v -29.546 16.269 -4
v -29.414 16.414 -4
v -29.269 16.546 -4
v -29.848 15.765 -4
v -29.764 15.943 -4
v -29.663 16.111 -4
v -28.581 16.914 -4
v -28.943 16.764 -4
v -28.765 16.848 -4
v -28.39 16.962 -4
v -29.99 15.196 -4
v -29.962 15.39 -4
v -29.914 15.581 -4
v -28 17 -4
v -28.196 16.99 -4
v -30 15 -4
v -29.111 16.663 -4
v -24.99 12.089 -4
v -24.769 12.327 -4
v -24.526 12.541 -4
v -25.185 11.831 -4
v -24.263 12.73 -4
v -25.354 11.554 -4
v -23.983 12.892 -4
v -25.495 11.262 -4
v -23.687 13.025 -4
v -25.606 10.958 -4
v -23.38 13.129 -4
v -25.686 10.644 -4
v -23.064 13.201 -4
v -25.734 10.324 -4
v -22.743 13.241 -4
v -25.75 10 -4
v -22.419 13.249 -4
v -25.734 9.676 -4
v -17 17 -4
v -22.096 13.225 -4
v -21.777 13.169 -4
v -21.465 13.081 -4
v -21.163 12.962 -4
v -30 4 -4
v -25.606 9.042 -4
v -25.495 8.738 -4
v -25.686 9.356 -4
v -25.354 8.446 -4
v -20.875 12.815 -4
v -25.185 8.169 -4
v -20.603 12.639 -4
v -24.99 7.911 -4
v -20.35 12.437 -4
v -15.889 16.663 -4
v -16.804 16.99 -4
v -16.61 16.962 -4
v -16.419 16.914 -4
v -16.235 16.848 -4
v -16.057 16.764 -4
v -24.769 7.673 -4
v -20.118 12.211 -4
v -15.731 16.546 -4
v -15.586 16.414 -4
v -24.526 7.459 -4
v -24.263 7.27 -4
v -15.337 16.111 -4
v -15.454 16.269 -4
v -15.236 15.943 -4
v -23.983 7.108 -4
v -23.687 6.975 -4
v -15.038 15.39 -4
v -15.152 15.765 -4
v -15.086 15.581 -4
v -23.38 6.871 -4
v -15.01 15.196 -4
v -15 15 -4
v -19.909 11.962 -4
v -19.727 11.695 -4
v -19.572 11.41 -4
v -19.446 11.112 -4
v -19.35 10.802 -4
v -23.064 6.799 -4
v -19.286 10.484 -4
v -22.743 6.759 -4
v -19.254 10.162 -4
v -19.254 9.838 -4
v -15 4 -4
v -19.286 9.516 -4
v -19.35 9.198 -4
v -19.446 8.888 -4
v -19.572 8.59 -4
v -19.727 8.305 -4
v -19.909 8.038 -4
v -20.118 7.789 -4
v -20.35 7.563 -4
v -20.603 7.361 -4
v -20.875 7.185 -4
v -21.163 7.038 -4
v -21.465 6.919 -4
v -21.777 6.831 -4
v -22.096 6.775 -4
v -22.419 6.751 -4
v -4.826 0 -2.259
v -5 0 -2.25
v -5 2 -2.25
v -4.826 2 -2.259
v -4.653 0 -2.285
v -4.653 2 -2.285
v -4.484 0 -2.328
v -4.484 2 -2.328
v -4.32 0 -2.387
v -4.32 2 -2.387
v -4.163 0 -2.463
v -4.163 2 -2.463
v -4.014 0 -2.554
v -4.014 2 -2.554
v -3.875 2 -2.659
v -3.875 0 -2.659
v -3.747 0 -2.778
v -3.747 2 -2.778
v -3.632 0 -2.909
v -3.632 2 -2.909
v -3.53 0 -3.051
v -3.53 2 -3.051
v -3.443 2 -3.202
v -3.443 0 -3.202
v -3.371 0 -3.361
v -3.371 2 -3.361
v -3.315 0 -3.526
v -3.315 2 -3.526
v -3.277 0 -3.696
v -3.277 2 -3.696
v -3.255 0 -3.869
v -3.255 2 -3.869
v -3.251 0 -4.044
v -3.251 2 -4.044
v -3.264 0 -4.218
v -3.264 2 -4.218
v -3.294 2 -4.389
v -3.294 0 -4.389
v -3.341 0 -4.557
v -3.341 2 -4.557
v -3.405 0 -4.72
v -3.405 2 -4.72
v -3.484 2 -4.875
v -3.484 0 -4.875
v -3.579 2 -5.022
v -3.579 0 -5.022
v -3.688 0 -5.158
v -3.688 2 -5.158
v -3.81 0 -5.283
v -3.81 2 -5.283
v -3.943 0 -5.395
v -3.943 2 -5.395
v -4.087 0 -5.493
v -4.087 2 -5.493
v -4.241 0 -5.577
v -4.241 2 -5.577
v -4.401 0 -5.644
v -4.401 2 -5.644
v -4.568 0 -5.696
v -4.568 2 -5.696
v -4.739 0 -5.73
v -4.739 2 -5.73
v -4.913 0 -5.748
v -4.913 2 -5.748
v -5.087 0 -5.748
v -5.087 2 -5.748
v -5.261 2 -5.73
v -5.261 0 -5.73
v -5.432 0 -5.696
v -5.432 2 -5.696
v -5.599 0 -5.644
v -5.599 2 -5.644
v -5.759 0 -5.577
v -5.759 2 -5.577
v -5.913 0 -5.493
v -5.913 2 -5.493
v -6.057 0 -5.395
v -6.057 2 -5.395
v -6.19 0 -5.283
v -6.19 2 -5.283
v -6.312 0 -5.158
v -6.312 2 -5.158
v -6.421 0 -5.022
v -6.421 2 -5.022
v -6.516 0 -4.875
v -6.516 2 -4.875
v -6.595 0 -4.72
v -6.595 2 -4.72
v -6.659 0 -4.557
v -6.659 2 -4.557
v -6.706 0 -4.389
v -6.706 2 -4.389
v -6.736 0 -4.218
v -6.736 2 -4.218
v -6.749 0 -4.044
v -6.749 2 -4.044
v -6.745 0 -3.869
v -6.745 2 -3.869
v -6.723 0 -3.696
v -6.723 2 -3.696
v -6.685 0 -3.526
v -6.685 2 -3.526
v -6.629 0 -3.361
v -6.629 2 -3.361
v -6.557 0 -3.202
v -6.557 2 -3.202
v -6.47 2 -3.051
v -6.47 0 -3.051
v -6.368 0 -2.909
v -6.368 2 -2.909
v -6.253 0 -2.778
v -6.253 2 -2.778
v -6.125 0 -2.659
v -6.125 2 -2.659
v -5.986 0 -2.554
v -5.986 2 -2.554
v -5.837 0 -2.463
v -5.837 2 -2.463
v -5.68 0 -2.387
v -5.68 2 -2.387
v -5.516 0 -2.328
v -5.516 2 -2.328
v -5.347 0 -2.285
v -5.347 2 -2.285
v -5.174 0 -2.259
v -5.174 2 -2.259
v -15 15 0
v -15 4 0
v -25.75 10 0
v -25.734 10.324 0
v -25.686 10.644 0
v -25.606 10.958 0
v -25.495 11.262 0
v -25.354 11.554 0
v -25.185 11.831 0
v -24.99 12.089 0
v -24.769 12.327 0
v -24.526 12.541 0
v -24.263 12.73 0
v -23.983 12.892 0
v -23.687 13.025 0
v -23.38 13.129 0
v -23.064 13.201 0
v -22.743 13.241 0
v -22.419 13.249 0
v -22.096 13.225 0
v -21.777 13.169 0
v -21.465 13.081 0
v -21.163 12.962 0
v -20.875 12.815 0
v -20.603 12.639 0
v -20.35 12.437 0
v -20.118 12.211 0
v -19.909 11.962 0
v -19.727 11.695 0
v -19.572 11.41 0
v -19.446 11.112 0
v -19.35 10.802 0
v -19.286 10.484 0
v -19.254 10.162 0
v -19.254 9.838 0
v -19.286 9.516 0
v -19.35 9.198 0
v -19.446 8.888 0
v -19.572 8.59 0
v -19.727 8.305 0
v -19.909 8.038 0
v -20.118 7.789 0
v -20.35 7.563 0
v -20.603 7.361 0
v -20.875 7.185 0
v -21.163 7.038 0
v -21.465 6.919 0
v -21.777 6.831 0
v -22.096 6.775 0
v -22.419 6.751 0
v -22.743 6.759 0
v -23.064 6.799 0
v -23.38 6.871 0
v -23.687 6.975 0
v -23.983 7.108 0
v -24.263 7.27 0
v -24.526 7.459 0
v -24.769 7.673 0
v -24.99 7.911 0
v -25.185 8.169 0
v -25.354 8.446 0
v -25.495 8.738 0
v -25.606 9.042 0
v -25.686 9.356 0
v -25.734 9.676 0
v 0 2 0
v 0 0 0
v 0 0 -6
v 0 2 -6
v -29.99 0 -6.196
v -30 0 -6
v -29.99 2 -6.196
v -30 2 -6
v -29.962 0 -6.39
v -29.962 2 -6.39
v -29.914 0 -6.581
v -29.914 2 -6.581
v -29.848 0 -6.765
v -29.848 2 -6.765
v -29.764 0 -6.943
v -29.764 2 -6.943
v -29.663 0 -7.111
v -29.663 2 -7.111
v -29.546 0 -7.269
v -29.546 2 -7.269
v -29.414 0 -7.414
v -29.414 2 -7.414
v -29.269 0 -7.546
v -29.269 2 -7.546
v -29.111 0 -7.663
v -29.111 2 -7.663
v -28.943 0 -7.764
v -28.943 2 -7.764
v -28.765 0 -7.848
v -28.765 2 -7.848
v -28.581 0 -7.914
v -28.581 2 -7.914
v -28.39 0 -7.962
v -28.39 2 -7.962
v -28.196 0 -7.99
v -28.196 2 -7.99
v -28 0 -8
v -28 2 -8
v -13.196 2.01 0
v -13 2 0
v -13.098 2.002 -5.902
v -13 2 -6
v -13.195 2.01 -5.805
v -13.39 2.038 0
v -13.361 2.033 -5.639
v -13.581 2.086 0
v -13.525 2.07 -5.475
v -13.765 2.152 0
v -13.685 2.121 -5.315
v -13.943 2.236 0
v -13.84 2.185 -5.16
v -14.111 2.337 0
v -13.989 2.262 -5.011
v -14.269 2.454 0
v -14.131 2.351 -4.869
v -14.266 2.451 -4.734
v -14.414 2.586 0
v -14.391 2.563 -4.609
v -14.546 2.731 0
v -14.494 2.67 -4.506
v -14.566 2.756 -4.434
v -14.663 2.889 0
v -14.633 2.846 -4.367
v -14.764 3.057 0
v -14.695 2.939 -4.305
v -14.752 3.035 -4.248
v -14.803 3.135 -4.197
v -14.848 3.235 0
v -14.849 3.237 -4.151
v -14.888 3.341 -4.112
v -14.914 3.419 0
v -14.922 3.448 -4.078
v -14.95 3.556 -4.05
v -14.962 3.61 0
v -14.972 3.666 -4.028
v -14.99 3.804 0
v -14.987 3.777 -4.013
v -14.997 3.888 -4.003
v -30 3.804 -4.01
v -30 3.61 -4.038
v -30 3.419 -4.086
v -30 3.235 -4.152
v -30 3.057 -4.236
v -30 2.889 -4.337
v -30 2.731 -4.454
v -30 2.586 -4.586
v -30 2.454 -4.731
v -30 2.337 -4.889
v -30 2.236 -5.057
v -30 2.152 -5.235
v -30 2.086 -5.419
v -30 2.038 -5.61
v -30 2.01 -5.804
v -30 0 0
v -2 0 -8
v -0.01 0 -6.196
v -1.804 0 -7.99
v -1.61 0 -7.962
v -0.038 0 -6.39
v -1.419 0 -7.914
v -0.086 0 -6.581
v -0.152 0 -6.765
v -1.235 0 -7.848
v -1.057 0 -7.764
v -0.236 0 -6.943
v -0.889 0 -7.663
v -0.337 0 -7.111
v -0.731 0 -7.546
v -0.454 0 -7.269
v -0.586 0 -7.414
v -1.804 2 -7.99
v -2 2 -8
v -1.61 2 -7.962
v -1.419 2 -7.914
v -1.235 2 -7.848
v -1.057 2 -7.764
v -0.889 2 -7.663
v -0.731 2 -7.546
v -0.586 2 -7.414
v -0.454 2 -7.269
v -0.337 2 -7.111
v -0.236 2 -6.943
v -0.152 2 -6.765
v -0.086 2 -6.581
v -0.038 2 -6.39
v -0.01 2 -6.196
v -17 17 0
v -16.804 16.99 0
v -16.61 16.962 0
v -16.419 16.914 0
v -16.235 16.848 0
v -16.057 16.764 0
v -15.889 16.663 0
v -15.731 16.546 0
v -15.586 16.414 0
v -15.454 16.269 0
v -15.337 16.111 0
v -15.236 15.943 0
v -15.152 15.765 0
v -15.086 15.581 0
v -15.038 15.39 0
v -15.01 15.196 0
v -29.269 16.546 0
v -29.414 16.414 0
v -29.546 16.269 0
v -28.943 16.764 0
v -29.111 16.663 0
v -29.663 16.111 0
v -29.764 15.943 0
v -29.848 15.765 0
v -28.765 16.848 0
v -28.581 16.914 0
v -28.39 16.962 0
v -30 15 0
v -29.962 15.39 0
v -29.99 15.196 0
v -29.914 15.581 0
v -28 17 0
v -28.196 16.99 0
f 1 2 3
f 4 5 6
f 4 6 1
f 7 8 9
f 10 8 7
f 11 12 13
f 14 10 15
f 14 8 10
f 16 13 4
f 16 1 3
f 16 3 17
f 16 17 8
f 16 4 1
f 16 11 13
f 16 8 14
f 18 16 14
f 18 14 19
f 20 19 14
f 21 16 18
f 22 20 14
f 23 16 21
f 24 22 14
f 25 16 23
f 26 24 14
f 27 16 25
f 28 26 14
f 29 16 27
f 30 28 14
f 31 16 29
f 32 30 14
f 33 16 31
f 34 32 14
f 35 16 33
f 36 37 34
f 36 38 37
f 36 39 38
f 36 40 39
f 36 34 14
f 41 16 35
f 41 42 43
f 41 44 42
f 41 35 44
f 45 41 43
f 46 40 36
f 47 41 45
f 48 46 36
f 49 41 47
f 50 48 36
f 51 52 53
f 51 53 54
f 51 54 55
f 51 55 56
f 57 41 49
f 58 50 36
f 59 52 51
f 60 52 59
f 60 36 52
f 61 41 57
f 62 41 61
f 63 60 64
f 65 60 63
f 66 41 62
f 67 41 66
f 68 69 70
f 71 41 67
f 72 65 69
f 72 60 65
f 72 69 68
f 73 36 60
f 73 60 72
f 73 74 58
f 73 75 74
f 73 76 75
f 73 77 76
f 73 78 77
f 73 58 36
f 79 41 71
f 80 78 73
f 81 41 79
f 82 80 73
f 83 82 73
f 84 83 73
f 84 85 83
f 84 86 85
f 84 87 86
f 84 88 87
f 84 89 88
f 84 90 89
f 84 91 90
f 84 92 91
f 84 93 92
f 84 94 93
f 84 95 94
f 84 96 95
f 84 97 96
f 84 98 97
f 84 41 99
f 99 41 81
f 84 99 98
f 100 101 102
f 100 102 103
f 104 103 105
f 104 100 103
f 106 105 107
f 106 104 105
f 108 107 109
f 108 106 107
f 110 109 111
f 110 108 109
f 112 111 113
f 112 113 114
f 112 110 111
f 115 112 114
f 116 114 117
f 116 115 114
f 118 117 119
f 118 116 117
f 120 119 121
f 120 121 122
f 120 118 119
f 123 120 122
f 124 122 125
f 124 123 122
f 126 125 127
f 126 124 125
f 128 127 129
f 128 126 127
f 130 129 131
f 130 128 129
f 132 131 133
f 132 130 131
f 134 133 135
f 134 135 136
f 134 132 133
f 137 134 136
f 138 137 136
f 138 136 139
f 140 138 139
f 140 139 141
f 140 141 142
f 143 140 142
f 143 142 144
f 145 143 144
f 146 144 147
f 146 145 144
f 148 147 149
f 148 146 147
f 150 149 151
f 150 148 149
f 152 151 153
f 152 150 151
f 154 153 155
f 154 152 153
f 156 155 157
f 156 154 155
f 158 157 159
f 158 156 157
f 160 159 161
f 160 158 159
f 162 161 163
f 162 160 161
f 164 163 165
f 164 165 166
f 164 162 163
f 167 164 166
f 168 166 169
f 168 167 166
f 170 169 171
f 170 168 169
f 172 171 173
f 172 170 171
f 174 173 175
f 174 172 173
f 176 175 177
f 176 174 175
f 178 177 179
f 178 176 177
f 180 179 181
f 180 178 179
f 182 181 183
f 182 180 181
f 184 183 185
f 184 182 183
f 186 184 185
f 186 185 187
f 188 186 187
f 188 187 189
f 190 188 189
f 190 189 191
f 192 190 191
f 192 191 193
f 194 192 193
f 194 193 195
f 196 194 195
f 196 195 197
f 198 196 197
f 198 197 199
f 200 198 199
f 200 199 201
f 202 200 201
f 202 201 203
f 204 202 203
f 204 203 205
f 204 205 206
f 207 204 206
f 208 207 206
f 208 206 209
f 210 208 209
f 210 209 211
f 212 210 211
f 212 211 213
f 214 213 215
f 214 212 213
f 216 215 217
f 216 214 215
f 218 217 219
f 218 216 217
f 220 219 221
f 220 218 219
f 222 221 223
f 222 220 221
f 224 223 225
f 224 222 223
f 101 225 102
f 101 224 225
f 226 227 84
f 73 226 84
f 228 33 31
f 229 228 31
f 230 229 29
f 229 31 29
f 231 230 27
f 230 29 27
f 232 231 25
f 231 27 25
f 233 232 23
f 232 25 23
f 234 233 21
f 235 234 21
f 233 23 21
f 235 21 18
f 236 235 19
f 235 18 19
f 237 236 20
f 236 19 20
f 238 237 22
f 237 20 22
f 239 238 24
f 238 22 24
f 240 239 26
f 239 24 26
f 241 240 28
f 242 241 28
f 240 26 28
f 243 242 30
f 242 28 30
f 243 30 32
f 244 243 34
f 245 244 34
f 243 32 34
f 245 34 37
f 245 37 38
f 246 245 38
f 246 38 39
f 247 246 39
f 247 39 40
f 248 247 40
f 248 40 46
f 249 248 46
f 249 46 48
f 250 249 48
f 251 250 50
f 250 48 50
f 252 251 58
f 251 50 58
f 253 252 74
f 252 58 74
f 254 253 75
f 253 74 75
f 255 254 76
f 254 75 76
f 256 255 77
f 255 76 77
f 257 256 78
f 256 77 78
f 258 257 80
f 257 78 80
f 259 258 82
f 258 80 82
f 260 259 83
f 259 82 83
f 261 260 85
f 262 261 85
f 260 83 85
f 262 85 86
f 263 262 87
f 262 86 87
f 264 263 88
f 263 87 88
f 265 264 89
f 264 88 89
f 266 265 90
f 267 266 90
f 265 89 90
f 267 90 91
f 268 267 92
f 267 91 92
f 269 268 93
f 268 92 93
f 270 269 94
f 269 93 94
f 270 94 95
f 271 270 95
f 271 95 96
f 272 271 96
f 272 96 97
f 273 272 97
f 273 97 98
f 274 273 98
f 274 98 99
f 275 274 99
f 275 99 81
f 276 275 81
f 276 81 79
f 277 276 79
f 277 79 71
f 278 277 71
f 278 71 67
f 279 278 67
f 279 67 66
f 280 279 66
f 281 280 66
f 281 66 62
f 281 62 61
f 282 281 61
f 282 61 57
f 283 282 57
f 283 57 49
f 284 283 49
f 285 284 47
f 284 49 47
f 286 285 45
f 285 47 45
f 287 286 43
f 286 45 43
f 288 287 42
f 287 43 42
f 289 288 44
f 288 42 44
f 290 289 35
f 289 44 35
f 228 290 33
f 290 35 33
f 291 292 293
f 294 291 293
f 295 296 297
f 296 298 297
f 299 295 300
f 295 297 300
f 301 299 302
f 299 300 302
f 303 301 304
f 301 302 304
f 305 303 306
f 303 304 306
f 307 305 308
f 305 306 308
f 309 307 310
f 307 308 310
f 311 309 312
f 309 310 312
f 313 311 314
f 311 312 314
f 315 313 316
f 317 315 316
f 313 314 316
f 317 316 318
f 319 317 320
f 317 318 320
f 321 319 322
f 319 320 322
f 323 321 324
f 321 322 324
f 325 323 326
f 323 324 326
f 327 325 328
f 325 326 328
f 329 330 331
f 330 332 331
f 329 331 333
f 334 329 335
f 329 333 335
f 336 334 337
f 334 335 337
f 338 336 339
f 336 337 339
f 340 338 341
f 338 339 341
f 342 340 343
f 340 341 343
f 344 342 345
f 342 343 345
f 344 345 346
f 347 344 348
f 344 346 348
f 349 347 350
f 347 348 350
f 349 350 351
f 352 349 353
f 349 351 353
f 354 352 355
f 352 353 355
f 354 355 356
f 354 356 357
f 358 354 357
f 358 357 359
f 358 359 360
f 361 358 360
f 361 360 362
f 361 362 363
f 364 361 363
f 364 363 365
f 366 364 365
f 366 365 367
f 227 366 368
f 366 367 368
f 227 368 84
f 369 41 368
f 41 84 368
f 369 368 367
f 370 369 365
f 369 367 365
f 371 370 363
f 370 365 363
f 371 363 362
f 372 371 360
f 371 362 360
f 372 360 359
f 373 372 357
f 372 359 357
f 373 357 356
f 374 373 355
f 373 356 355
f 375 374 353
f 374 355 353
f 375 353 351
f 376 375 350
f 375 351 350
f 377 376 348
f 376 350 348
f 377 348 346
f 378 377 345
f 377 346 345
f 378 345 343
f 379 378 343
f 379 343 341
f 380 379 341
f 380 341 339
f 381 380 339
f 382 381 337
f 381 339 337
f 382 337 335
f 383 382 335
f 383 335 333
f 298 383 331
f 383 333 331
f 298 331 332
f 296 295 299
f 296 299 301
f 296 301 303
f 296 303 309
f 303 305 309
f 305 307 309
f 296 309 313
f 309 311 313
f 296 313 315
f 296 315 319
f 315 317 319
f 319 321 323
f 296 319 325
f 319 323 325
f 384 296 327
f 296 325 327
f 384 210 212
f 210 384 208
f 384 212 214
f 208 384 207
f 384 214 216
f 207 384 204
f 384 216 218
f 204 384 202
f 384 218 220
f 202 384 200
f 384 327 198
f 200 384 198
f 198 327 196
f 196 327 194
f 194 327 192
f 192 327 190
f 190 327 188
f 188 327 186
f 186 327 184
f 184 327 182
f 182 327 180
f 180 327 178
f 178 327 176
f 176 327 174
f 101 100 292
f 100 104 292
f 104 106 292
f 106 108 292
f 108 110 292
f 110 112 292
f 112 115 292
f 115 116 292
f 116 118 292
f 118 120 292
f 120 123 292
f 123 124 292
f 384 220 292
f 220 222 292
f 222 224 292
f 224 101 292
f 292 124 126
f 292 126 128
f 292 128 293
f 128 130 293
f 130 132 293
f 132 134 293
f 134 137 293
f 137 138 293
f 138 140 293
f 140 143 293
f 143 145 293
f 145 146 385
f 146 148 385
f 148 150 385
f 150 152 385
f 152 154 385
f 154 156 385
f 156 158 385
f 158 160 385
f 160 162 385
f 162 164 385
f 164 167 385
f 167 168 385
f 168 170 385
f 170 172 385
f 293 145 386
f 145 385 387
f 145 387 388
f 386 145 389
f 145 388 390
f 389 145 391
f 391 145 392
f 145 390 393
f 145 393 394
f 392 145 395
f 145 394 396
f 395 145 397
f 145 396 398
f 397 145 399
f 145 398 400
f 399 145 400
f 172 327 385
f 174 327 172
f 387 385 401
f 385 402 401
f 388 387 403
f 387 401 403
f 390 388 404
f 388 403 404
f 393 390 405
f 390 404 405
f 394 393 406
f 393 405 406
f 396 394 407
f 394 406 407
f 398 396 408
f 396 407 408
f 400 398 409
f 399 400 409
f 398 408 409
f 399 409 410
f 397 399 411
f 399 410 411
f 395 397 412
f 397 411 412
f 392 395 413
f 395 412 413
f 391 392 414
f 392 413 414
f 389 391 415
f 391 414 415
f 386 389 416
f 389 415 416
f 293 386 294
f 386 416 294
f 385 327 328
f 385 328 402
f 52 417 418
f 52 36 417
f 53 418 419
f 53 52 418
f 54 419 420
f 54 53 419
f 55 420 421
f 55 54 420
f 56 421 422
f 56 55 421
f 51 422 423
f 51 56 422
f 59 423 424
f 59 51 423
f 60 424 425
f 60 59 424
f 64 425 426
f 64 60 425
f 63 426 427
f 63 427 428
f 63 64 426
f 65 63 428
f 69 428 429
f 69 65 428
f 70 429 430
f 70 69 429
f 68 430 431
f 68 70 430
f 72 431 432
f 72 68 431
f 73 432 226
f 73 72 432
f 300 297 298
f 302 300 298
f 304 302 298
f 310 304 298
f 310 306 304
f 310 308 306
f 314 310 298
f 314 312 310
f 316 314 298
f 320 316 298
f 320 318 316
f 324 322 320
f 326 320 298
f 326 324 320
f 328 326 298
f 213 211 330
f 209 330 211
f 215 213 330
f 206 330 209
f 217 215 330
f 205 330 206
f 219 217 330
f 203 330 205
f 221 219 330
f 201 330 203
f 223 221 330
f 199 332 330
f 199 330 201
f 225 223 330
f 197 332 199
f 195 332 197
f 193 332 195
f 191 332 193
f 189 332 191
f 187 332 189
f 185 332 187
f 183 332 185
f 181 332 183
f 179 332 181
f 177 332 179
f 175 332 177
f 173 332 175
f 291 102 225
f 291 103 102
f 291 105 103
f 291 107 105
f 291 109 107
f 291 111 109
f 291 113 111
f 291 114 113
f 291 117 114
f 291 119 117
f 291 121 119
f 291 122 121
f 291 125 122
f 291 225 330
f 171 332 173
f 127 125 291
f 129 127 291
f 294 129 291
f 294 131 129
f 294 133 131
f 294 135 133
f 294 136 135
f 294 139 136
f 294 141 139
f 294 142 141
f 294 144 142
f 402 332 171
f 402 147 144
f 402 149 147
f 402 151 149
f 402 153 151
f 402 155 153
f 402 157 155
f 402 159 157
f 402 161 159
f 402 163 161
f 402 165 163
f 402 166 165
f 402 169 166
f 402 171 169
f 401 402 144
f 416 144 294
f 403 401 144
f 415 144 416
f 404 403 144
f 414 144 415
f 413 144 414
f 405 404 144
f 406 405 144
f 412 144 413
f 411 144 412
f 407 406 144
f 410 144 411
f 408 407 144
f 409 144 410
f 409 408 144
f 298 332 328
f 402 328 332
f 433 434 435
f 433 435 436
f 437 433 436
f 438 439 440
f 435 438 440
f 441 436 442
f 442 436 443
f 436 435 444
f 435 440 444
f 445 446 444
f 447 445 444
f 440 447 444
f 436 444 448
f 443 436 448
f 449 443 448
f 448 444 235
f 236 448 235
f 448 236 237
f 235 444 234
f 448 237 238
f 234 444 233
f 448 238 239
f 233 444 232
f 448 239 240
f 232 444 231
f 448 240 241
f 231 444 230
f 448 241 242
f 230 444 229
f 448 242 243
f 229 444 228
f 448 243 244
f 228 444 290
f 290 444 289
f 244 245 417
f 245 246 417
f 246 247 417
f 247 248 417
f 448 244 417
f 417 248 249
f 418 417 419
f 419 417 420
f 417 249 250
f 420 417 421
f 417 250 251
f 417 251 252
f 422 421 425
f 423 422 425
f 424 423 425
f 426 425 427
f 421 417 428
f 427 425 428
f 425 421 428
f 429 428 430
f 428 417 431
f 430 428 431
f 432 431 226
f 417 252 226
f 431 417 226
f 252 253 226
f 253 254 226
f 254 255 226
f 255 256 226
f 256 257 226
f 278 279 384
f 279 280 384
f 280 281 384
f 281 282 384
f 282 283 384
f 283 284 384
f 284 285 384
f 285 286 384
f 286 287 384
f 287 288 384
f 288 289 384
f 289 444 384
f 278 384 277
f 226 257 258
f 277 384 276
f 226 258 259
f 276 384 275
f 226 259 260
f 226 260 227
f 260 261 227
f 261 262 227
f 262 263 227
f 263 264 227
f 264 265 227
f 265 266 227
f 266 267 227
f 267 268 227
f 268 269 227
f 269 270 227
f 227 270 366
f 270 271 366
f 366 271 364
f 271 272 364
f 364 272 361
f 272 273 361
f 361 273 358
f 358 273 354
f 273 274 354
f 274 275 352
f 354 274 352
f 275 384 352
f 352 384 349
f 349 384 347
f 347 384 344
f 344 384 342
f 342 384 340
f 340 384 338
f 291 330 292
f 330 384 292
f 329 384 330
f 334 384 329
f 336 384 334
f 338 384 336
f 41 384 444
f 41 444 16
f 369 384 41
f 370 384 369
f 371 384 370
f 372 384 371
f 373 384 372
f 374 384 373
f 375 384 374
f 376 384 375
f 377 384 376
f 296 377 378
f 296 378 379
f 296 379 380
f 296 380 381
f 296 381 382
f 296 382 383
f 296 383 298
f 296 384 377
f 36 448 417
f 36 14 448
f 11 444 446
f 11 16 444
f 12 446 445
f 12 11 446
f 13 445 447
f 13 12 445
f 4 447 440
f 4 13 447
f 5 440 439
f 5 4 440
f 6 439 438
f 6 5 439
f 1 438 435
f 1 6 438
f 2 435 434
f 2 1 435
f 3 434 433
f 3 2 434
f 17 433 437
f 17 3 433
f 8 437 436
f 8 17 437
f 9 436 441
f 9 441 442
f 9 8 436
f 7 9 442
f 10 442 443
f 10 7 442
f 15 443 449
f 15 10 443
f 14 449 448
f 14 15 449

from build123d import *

# Parameters (mm, degrees)
CROQUIS1_W              = 30
CROQUIS1_H              = 8
CROQUIS1_R              = 1.75
SALIENTE_EXTRUIR1_DEPTH = 2
CROQUIS2_W              = 15
CROQUIS2_H              = 4
SALIENTE_EXTRUIR2_DEPTH = 15
CROQUIS3_R              = 3.25
CORTAR_EXTRUIR1_DEPTH   = 4
REDONDEO1_R             = 2


with BuildPart() as part:
    # Croquis1 → Saliente-Extruir1 (new body)
    with BuildSketch(Plane(origin=(0, 0, 0), x_dir=(1, 0, 0), z_dir=(0, 1, 0))):
        with Locations((-15, 4)):
            Rectangle(CROQUIS1_W, CROQUIS1_H)
        with Locations(Location((-5, 4, 0), (0, 0, 270))):
            Circle(CROQUIS1_R, mode=Mode.SUBTRACT)
    extrude(amount=SALIENTE_EXTRUIR1_DEPTH)

    # Croquis2 → Saliente-Extruir2 (add)
    with BuildSketch(Plane(origin=(0, 2, 0), x_dir=(1, 0, 0), z_dir=(0, 1, 0))):
        with Locations((-22.5, 2)):
            Rectangle(CROQUIS2_W, CROQUIS2_H)
    extrude(amount=SALIENTE_EXTRUIR2_DEPTH)

    # Croquis3 → Cortar-Extruir1 (cut)
    with BuildSketch(Plane(origin=(0, 0, -4), x_dir=(-1, 0, 0), z_dir=(0, 0, -1))):
        with Locations((22.5, 10)):
            Circle(CROQUIS3_R)
    extrude(amount=-CORTAR_EXTRUIR1_DEPTH, mode=Mode.SUBTRACT)

    # Redondeo1
    redondeo1_edges = [part.edges().sort_by_distance(p)[0] for p in [
        (0, 1, -8),
        (-30, 1, -8),
        (-30, 17, -2),
        (-15, 17, -2),
        (-22.5, 2, -4),
        (-15, 2, -2),
    ]]
    fillet(redondeo1_edges, radius=REDONDEO1_R - 0.0001)  # a hair under: the kernel refuses the full size


solid = part.part
